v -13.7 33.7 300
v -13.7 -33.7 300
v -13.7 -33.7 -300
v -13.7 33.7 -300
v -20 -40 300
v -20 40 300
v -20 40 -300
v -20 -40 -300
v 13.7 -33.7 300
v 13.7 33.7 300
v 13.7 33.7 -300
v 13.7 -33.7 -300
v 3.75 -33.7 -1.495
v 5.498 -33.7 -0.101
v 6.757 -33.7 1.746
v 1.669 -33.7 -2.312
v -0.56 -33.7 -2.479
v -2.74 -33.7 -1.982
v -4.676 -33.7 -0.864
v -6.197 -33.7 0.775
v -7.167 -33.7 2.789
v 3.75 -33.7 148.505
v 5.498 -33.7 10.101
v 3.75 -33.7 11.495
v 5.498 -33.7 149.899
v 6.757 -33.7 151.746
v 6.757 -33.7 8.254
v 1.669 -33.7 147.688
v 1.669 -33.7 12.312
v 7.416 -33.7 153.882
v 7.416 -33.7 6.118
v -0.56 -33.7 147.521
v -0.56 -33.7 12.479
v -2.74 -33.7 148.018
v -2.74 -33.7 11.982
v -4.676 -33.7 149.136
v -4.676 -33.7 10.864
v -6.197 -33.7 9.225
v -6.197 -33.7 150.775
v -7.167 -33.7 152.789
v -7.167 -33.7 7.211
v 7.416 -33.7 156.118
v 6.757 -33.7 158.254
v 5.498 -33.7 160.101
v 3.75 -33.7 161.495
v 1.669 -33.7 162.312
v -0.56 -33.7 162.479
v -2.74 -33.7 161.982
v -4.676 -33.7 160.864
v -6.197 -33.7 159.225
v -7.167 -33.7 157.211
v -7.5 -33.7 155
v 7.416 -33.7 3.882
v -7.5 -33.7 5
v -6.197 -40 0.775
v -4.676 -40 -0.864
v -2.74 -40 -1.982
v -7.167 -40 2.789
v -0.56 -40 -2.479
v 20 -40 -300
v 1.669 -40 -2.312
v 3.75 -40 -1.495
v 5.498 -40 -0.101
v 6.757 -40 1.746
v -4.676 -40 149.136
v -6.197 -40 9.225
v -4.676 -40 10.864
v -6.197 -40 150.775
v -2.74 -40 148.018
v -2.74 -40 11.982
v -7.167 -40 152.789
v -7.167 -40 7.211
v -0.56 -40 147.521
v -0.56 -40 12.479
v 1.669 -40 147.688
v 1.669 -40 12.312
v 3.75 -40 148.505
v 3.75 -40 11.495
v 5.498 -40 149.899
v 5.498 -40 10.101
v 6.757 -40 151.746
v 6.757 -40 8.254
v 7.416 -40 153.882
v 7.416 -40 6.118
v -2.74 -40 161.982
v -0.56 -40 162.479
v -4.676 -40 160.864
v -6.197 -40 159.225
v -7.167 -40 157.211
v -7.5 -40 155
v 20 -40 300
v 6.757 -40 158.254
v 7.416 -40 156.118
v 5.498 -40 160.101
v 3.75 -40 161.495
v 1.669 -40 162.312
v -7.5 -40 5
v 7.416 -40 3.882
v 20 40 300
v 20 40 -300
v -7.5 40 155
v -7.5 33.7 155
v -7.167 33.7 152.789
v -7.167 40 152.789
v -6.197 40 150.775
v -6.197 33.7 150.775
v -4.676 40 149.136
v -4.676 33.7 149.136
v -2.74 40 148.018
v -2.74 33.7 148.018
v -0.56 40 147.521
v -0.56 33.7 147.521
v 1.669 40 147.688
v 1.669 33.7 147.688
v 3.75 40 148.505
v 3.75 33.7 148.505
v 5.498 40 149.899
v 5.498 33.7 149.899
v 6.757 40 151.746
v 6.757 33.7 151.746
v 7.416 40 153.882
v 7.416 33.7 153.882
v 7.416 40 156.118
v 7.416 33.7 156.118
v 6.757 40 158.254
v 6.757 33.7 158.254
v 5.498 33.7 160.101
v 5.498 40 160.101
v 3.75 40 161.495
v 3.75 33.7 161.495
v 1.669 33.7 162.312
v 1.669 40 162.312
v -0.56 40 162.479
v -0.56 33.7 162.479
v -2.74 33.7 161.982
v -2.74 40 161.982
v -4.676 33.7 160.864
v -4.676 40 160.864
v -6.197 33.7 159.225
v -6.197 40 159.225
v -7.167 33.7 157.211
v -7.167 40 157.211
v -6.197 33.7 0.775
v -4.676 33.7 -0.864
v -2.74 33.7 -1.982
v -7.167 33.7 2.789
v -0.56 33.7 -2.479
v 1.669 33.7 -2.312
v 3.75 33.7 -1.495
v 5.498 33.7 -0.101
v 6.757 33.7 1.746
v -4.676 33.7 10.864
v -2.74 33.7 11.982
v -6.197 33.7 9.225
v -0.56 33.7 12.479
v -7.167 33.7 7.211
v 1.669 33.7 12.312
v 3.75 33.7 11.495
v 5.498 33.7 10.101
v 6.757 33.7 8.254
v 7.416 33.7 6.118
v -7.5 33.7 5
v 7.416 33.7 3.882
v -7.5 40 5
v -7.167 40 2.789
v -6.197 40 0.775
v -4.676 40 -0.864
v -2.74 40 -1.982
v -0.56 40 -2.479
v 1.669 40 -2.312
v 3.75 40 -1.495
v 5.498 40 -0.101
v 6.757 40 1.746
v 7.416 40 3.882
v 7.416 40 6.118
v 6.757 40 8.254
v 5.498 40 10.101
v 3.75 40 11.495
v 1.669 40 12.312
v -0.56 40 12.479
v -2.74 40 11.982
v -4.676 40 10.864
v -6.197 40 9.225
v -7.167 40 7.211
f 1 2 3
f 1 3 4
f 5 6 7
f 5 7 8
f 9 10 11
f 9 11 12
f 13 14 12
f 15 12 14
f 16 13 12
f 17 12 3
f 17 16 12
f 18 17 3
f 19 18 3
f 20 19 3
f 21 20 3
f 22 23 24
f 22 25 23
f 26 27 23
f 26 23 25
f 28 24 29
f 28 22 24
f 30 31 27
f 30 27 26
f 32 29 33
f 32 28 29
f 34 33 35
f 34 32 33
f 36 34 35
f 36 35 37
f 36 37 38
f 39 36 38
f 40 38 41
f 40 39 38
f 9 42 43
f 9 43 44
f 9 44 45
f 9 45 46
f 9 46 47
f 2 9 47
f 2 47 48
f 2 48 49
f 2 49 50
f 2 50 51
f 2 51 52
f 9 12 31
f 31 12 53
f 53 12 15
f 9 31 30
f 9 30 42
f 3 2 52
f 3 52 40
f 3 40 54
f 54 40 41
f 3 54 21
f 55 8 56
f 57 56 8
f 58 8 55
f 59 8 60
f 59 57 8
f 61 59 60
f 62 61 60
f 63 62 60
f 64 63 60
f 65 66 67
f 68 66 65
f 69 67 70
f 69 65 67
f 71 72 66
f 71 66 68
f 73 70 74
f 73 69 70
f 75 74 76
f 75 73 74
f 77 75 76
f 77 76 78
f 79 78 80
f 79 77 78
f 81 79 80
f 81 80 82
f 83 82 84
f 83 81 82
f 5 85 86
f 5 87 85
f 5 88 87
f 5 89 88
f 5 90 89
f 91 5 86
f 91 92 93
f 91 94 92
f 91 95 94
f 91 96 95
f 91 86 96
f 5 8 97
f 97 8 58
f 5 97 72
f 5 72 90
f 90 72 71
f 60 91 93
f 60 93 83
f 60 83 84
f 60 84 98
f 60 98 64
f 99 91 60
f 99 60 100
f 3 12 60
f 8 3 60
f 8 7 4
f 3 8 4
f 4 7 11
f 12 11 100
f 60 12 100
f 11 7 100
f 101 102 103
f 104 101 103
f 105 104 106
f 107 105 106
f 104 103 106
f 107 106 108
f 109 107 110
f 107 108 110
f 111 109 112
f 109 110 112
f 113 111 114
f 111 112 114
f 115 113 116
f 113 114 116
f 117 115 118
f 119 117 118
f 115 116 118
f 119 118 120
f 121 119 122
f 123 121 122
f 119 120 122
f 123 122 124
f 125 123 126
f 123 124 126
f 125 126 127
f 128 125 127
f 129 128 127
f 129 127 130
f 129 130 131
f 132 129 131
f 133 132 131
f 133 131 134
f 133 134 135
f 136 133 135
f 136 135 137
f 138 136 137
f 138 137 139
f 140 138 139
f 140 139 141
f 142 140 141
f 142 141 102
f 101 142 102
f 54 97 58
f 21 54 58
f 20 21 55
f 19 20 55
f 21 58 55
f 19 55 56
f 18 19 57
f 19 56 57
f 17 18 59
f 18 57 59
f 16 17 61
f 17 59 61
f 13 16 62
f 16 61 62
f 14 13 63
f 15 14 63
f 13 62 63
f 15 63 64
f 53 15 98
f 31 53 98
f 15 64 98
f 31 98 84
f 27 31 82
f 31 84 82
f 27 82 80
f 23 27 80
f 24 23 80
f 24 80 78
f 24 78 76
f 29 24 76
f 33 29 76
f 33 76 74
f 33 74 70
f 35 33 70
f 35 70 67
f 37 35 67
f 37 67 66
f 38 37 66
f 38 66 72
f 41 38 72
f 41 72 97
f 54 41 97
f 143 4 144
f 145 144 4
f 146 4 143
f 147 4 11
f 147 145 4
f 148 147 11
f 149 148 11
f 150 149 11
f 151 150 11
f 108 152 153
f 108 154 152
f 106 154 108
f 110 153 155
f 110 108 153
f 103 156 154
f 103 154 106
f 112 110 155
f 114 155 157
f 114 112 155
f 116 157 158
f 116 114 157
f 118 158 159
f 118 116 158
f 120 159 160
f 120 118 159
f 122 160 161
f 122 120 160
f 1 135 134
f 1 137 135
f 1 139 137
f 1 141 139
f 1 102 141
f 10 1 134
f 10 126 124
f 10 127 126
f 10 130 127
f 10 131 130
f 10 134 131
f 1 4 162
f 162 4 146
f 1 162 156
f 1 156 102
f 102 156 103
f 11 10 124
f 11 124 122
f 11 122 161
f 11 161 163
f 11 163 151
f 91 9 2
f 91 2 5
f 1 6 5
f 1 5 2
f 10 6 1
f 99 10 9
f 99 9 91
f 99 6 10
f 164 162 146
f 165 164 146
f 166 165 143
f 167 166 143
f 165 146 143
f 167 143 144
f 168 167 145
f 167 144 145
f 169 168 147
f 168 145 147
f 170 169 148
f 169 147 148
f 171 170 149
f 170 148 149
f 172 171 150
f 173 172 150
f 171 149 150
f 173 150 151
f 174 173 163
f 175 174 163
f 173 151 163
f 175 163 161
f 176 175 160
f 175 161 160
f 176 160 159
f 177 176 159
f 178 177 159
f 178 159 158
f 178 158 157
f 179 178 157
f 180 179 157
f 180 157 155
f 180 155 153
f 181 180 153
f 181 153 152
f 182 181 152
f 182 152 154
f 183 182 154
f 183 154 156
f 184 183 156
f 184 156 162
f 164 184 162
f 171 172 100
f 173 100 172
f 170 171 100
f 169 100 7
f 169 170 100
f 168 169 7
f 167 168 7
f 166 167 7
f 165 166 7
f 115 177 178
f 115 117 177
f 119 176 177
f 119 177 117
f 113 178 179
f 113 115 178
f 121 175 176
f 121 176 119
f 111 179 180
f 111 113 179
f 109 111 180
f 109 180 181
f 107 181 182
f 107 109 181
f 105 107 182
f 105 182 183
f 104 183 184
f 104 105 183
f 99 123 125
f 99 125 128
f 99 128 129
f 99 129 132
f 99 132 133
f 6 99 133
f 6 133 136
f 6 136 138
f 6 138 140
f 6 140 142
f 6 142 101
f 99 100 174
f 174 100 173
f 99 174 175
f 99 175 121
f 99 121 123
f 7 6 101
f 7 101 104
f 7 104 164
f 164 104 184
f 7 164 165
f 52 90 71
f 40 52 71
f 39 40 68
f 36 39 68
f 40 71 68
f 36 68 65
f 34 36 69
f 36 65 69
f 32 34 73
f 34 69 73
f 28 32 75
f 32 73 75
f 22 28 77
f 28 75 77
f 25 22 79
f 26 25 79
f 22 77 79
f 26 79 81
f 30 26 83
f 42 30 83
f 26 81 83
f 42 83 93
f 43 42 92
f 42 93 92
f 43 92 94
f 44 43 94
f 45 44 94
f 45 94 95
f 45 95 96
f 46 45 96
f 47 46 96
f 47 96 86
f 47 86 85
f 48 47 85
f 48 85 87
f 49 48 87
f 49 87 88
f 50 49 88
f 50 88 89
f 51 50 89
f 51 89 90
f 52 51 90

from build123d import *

# Parameters (mm, degrees)
SKETCH1_W             = 40
SKETCH1_H             = 80
SKETCH1_W_2           = 27.4
SKETCH1_H_2           = 67.4
M12_CLEARANCE_HOLE1_D = 15


with BuildPart() as part:
    # Sweep1: sweep along a curve in space
    with BuildLine() as sweep1_path:
        add(Edge.make_bspline(
            [(0, 0, -300), (0, 0, 300)],
            knots=[0, 0, 1, 1], degree=1))
    # Sketch1 → Sweep1 (sweep)
    with BuildSketch(Plane.XY):
        Rectangle(SKETCH1_W, SKETCH1_H)
        Rectangle(SKETCH1_W_2, SKETCH1_H_2, mode=Mode.SUBTRACT)
    sweep(path=sweep1_path.line)

    # M12 Clearance Hole1 (through all)
    with Locations(Plane(origin=(0, 40, 0), x_dir=(1, 0, 0), z_dir=(0, 1, 0))):
        with Locations((0, -155), (0, -5)):
            Hole(M12_CLEARANCE_HOLE1_D / 2)


solid = part.part
